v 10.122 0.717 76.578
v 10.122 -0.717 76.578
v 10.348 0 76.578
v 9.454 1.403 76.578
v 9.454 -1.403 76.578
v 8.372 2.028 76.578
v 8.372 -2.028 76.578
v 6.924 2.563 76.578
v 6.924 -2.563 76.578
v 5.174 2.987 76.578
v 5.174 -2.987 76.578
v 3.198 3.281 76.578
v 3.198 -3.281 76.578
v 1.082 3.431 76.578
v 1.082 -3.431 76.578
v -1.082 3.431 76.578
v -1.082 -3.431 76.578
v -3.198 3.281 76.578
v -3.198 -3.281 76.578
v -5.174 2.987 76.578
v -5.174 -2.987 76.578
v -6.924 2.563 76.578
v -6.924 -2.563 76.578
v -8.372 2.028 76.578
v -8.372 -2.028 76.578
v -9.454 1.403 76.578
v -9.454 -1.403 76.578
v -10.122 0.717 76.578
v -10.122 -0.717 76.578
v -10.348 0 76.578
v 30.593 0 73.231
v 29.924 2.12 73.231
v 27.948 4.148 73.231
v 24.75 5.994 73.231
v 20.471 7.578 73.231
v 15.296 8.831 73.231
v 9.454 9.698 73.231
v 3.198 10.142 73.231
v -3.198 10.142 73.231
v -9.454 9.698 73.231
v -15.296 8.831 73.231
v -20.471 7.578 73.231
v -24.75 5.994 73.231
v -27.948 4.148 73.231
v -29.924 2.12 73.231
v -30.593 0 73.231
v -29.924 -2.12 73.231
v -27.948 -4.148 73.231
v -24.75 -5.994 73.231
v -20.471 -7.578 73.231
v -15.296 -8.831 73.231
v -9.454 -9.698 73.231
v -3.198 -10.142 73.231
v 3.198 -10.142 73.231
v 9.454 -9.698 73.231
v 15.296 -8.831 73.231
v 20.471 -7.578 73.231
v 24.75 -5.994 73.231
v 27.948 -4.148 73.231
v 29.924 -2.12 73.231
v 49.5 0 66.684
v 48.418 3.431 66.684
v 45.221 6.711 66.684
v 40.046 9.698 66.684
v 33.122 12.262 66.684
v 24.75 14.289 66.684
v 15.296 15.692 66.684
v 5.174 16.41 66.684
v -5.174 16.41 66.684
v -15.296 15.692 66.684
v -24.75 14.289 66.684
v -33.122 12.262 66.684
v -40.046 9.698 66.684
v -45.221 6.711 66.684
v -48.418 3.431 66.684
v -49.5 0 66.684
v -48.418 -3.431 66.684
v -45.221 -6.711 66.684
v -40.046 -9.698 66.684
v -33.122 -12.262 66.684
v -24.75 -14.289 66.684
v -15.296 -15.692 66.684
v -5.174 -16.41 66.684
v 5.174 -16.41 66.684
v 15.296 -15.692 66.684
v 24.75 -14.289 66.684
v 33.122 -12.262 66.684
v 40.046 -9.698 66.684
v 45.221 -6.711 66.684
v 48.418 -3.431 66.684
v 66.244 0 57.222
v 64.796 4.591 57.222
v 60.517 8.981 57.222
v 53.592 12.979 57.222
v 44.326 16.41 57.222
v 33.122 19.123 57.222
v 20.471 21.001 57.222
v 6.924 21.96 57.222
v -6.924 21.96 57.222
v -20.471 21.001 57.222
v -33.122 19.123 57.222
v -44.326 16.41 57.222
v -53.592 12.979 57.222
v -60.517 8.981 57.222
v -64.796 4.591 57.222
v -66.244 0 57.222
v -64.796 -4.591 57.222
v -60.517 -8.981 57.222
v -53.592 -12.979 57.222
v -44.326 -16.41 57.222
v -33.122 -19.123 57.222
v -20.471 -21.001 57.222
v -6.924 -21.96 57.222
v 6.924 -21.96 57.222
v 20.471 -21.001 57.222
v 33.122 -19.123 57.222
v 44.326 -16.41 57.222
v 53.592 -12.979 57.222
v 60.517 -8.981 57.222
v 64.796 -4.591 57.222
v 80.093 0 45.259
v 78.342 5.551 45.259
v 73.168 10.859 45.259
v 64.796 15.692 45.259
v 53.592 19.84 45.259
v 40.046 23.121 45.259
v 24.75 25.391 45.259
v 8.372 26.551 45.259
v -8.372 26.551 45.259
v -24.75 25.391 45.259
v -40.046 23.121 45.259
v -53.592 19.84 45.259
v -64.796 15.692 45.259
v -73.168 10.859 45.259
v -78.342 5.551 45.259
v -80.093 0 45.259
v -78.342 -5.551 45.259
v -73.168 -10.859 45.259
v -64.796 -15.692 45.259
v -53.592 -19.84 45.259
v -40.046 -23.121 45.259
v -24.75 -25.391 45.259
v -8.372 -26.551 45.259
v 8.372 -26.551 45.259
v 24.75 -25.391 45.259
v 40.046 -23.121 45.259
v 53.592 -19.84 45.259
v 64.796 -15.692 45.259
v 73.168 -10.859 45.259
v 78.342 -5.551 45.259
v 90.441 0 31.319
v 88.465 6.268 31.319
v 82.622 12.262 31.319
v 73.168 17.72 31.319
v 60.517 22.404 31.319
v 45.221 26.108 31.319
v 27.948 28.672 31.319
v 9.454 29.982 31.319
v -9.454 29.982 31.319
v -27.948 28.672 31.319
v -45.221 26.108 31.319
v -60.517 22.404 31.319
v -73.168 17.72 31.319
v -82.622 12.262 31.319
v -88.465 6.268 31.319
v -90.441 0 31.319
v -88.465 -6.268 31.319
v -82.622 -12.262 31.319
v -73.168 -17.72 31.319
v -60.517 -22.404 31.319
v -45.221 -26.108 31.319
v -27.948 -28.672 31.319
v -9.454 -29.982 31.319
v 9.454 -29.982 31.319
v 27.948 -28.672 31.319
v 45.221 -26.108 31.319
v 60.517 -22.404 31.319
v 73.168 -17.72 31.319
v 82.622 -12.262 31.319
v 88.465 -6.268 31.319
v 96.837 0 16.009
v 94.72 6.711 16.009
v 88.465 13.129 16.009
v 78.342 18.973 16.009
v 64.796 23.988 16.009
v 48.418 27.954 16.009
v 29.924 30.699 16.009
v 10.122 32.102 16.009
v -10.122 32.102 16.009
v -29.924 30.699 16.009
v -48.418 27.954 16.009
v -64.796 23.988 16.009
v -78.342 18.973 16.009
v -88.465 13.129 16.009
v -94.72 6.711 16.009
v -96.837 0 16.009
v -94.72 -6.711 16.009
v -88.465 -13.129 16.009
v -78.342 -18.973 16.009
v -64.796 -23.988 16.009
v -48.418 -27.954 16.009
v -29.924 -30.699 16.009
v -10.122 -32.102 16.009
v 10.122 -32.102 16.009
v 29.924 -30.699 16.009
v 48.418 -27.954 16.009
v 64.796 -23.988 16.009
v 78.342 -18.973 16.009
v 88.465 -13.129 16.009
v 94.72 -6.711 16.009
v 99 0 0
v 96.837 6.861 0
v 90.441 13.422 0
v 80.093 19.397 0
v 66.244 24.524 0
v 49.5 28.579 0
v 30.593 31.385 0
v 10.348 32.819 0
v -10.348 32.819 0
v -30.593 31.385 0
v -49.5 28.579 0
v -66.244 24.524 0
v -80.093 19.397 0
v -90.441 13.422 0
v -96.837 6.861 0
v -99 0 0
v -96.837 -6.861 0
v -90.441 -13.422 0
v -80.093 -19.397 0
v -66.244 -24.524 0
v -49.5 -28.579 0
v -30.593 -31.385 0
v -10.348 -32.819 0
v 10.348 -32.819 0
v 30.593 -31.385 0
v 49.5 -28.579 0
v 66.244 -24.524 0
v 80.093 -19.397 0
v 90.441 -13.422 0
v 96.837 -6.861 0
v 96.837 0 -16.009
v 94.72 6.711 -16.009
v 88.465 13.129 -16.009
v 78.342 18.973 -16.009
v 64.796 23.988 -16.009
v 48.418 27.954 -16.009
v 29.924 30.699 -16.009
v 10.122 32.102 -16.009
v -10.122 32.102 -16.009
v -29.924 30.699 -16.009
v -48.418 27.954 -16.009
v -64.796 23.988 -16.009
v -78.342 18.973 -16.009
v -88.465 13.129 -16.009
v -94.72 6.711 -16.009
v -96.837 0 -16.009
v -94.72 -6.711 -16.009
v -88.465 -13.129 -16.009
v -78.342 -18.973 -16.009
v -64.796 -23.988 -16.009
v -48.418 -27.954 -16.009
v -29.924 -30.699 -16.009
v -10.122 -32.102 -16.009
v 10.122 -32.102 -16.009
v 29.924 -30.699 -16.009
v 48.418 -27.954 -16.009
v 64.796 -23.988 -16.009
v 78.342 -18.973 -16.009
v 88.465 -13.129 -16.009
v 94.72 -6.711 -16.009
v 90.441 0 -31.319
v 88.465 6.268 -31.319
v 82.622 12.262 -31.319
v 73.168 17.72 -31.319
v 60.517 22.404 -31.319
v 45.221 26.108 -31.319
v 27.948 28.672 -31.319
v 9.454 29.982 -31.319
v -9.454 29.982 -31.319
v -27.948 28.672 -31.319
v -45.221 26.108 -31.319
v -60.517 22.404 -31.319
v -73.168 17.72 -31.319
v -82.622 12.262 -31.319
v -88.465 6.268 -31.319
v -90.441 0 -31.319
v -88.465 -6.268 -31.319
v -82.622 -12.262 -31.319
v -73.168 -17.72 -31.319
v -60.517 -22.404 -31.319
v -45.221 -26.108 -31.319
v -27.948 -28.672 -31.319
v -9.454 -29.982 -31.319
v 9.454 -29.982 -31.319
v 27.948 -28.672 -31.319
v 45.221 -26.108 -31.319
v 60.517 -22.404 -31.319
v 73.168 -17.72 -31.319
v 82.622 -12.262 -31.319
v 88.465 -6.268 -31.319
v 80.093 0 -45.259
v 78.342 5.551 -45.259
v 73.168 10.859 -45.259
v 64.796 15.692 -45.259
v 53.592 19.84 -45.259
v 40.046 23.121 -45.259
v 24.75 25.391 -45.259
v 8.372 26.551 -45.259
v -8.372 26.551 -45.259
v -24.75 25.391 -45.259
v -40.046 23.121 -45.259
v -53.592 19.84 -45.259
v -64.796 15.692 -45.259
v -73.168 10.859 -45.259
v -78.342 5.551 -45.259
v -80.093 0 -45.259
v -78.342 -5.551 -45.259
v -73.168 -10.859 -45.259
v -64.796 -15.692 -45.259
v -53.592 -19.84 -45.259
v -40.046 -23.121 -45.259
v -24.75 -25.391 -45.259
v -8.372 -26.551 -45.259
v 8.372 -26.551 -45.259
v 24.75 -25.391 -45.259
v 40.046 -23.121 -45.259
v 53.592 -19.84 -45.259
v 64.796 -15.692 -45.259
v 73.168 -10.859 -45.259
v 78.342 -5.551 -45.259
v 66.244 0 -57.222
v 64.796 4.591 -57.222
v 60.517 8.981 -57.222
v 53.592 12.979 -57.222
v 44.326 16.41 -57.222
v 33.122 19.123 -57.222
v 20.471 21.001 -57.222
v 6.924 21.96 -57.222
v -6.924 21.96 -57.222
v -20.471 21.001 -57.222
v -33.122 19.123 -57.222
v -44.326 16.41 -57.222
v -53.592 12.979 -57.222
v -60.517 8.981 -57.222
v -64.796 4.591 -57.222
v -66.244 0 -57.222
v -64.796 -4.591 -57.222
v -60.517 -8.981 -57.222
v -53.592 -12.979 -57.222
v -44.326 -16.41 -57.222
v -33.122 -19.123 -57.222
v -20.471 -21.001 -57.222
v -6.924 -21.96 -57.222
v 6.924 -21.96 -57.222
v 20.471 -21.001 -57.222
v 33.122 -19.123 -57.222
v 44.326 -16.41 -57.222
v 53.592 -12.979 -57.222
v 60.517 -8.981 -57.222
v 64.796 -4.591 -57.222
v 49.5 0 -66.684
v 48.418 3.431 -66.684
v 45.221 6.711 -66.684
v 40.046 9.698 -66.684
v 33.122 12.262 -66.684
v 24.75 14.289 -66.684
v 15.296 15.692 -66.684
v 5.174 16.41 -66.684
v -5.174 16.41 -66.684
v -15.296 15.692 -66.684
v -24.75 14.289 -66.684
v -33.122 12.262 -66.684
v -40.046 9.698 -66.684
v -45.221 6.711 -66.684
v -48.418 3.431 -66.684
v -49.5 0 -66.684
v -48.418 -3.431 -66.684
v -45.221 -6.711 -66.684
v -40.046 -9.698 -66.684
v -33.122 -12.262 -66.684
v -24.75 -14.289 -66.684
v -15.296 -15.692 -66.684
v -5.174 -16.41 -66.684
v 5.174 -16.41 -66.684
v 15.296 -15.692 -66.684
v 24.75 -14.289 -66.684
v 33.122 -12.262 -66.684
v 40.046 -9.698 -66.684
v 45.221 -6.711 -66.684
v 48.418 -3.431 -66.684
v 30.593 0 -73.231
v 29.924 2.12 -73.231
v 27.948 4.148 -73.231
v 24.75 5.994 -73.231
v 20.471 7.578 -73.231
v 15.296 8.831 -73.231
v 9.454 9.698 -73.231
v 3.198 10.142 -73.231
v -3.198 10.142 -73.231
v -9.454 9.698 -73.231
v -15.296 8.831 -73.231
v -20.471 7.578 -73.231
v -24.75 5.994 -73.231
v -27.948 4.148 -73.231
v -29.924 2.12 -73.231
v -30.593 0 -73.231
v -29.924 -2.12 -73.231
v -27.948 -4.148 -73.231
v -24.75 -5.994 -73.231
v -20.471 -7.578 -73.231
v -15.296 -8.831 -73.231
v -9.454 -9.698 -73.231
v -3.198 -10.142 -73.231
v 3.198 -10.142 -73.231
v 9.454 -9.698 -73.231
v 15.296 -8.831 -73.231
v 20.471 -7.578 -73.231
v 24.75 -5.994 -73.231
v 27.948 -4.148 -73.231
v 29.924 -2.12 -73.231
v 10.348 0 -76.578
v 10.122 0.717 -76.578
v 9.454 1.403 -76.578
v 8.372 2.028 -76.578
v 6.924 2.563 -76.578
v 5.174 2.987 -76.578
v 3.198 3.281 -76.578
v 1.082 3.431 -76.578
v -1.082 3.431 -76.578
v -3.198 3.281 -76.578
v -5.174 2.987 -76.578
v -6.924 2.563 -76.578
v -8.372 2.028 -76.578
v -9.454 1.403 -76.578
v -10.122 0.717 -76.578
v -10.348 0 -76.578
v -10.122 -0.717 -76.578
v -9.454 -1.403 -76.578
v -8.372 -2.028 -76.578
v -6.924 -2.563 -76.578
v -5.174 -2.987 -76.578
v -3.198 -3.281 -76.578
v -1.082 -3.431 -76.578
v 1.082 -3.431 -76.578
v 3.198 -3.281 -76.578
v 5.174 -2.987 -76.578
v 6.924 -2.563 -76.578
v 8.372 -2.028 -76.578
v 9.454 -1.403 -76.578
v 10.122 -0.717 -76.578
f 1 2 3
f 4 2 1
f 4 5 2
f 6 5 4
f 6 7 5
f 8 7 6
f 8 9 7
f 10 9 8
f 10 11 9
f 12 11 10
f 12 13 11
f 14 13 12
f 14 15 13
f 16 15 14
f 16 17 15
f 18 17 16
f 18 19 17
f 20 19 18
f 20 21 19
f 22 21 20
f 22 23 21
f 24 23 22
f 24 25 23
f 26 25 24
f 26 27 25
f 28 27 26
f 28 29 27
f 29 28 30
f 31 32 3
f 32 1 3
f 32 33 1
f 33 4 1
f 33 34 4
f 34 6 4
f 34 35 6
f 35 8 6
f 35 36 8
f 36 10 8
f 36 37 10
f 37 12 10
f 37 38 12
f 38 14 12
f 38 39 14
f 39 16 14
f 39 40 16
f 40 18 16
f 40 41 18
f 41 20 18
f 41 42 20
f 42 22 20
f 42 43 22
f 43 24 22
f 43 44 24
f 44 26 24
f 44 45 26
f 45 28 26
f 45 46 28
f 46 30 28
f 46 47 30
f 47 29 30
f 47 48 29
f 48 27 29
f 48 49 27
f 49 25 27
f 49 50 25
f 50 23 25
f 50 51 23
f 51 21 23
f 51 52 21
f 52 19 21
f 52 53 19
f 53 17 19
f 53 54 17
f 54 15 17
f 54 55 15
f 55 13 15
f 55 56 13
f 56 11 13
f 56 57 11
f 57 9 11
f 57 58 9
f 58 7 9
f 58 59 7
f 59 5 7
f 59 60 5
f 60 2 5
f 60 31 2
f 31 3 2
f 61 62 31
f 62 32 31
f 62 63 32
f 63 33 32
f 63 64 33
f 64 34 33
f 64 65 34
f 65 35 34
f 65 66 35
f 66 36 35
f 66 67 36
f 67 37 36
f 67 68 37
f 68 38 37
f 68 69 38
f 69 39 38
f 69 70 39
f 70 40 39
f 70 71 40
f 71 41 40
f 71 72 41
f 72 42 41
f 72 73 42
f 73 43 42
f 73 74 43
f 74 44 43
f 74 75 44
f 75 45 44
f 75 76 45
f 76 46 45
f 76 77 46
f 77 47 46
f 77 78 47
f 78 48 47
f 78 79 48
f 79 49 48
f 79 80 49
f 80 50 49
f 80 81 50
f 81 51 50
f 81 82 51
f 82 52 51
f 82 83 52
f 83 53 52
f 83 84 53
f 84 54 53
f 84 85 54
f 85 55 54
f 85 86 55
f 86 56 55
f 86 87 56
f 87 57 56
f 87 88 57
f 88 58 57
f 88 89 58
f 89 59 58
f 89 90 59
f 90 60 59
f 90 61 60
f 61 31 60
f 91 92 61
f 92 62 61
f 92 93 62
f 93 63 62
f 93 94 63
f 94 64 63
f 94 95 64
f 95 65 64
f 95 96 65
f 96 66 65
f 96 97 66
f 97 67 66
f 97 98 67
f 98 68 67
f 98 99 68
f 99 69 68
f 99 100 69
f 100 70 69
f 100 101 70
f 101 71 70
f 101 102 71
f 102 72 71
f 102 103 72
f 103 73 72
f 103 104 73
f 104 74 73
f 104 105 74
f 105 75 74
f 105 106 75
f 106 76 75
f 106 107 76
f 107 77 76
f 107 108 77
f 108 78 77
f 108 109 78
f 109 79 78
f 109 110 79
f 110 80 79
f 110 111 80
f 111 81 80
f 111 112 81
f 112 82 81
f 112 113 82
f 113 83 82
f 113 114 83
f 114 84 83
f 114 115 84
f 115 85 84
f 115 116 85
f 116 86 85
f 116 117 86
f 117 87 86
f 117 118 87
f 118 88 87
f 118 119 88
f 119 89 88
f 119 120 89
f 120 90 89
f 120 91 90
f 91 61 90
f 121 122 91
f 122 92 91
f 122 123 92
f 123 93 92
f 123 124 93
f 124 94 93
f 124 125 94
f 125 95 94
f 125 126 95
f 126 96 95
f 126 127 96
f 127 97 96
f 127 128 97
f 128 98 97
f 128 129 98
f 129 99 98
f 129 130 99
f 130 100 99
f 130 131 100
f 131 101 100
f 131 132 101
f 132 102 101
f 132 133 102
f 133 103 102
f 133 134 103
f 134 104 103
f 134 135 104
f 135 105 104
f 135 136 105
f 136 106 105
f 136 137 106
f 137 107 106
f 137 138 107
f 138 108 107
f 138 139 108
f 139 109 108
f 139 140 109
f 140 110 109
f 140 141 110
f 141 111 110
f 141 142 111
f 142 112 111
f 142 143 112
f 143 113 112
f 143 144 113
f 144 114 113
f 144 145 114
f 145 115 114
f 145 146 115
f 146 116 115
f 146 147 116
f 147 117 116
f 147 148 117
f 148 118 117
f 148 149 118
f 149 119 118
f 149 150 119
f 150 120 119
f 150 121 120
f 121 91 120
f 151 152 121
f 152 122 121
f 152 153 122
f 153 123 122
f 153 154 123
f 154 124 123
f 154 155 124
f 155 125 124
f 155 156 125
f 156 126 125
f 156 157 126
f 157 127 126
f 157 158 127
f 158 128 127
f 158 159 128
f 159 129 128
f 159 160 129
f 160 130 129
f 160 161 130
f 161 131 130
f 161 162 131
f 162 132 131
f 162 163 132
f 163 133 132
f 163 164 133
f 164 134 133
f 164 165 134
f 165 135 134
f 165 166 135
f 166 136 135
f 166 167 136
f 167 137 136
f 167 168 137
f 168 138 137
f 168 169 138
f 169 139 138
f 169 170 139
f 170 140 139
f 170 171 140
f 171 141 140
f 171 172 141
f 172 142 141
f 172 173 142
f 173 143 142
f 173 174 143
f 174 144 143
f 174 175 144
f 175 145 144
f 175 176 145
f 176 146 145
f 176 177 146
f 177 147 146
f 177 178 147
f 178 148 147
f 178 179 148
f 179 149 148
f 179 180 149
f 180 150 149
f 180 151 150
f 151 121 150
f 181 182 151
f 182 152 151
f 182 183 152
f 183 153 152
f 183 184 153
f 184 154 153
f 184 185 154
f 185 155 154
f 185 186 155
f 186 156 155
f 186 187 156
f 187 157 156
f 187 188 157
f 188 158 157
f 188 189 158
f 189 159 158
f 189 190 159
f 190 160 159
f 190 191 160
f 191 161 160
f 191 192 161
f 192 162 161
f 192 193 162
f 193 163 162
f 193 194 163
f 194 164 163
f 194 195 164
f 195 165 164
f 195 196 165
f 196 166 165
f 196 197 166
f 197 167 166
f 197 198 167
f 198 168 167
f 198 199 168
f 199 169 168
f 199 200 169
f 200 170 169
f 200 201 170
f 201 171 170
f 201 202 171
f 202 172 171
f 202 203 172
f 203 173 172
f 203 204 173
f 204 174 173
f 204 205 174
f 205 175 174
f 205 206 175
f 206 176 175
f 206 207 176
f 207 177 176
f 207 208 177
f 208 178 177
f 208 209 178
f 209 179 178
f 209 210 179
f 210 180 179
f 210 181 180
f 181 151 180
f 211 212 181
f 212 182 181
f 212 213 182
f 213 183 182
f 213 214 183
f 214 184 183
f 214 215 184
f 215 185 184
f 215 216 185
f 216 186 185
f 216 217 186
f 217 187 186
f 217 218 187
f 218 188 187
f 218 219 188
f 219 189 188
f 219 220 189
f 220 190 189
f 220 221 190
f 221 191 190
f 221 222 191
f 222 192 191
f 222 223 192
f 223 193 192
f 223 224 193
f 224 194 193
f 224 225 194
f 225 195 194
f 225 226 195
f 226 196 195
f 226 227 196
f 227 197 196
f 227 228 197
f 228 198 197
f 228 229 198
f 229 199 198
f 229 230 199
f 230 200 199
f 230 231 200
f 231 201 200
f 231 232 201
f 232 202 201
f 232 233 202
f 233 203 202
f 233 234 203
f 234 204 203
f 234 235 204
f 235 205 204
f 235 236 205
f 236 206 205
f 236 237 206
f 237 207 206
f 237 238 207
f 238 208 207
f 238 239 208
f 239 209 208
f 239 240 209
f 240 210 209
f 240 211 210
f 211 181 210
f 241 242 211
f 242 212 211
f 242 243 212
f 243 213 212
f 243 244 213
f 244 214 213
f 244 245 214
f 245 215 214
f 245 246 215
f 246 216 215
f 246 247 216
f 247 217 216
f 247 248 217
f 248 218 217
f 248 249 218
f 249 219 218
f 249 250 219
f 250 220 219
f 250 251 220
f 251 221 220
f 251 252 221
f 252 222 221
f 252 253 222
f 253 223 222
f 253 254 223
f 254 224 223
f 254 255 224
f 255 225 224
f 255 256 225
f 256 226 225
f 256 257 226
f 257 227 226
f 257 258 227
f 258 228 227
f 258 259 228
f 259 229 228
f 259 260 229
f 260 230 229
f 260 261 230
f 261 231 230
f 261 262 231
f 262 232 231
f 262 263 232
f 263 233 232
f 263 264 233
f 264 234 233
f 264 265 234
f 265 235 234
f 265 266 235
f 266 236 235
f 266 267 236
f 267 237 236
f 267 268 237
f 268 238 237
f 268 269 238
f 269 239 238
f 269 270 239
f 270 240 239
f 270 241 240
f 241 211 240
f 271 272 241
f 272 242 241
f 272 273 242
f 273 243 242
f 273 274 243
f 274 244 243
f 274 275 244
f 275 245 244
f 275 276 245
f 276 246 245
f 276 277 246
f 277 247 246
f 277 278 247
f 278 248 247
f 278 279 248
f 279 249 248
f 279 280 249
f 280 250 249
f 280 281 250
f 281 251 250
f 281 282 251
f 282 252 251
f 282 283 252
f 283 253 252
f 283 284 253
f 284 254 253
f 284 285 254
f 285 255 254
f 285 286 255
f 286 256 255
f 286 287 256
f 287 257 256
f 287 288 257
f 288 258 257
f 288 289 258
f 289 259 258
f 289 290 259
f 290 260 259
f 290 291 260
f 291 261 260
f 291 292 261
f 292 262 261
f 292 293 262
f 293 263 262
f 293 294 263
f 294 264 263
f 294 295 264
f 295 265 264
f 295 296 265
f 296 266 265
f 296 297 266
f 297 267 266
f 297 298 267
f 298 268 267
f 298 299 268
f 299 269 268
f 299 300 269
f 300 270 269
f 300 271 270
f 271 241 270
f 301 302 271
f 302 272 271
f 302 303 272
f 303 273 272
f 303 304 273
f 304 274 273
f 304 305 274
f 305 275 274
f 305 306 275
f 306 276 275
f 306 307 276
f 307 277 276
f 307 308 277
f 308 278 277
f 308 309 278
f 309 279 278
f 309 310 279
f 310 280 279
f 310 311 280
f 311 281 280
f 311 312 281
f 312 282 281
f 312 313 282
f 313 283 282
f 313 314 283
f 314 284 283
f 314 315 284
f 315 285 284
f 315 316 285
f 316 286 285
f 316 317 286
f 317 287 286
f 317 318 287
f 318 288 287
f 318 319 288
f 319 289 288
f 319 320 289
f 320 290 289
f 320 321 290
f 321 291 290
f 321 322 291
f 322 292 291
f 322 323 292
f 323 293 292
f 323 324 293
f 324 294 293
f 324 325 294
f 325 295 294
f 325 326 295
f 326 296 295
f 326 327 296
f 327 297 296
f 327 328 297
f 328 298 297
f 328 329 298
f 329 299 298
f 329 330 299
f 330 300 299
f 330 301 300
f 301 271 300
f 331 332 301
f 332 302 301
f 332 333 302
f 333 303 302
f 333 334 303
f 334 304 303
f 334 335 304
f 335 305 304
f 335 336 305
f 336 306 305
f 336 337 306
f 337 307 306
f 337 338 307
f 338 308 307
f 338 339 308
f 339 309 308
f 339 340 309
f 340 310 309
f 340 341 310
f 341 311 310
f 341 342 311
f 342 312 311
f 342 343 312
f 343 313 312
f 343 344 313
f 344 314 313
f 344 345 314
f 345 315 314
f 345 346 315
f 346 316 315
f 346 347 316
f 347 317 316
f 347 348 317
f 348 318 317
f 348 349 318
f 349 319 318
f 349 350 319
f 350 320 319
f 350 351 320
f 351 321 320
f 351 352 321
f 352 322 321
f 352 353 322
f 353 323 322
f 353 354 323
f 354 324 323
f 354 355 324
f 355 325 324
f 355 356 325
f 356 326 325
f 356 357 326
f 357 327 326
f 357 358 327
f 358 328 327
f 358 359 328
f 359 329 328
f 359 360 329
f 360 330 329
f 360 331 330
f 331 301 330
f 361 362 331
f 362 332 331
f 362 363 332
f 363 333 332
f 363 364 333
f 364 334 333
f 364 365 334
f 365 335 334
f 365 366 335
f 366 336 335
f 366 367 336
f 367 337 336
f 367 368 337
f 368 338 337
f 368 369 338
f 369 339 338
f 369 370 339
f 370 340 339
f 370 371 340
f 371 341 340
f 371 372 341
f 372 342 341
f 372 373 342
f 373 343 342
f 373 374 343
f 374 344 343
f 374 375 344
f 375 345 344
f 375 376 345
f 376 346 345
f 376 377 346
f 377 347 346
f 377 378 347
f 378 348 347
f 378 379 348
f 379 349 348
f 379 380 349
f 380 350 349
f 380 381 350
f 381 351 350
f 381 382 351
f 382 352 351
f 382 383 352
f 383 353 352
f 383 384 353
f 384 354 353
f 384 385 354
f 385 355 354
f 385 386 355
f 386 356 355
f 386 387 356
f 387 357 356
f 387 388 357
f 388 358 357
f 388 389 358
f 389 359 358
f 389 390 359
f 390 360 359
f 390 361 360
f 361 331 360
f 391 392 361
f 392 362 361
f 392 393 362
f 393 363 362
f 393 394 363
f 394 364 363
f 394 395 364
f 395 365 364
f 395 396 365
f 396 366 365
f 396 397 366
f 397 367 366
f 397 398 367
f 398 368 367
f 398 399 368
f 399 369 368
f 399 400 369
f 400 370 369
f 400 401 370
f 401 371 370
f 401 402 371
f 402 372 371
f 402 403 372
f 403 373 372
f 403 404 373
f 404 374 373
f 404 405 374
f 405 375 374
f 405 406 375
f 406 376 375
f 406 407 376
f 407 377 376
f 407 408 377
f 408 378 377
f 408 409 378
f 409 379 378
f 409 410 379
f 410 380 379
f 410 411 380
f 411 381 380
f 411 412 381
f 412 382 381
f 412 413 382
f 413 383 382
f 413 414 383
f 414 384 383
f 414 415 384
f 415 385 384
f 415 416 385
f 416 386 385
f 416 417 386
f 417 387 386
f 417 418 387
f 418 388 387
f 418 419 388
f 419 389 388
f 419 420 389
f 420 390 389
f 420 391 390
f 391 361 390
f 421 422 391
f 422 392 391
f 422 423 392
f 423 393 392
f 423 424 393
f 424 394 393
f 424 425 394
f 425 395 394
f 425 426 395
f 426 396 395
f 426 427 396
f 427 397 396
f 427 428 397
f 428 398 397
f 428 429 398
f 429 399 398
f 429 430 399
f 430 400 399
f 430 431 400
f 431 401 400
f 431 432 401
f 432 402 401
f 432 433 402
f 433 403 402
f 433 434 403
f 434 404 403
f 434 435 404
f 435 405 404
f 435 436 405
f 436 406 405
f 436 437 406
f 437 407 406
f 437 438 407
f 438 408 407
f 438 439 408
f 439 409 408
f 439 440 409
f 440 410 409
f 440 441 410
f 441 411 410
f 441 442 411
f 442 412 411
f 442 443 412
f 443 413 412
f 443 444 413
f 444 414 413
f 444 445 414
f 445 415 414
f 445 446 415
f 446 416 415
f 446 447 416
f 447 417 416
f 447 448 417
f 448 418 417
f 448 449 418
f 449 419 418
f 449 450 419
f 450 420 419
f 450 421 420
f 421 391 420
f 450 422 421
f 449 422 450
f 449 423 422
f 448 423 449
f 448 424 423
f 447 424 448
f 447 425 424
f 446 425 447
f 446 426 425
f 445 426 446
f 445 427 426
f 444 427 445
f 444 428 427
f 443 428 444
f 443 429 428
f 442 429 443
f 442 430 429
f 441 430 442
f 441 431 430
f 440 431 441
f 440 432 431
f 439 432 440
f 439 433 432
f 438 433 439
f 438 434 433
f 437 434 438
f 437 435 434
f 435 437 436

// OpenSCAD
// Generated by SolidPython 1.0.1 on 2020-07-29 00:46:48


scale(v = [9, 3, 7]) {
	sphere(r = 11);
}
/***********************************************
*********      SolidPython code:      **********
************************************************
 
# import packages: SolidPython
from solid import *
from solid.utils import *
from itertools import chain, combinations, permutations


class Resize:

    def __init__(self, scad_file):
        self.scad_file = scad_file
        #self.scad_file = import_scad(scad_file)
        # cone/cylinder param:
        self.r1 = 0
        self.r2 = 0
        self.h = 0
        # rectangular prism param:
        self.w = 0
        self.l = 0
        # ellipse param:
        self.r = 0

    # import OpenScad code (file name corresponds to shape)


    # classify shape + parameters
    def assign(self, param1, param2, param3):
        if self.scad_file == 'cone.scad':
            self.r1 = param1
            self.r2 = param2
            self.h = param3
        elif self.scad_file == 'cylinder.scad':
            self.r1 = param1
            self.r2 = param2
            self.h = param3
        elif self.scad_file == 'rectangularPrism.scad':
            self.h = param1
            self.l = param2
            self.w = param3
        else:
            self.r = param1
            self.h = param2

    # resize parameters
    def iterate(self):
        x = range(3, 20, 2)
        i = 1
        if self.scad_file == 'cone.scad':
            tempList = list(permutations(x, 2))
            for temp in tempList:
                param1 = temp[0]
                param2 = temp[1]
                filepath = 'produced_scad_files/' + 'cone' + str(param1) + '_' + str(param2) + '_' + '.scad'
                scad_render_to_file(cylinder(h=param1, r1=param2, r2=0), filepath)

        elif self.scad_file == 'cylinder.scad':
            tempList = list(permutations(x, 3))
            for temp in tempList:
                param1 = temp[0]
                param2 = temp[1]
                filepath = 'produced_scad_files/' + 'cylinder' + str(param1) + '_' + str(param2) + '_' + '.scad'
                scad_render_to_file(cylinder(h=param1, r1=param2, r2=param2), filepath)

        elif self.scad_file == 'rectangularPrism.scad':
            tempList = list(permutations(x, 3))
            for temp in tempList:
                param1 = temp[0]
                param2 = temp[1]
                param3 = temp[2]
                filepath = 'produced_scad_files/' + 'rectangularPrism' + str(param1) + '_' + str(param2) + '_' + str(
                    param3) + '.scad'
                scad_render_to_file(cube(size=(param1, param2, param3)), filepath)

        elif self.scad_file == 'ellipse.scad':
            tempList = list(permutations(x, 4))
            for temp in tempList:
                param1 = temp[0]
                param2 = temp[1]
                param3 = temp[2]
                param4 = temp[3]
                filepath = 'produced_scad_files/' + 'ellipse' + str(param1) + '_' + str(param2) + '_' + str(param3) + '_' + str(param4) + '.scad'
                scad_render_to_file(scale([param1, param2, param3])(sphere(r=param4)), filepath)

    def render_to_scadfile(self):
        scad_render_to_file(scad, 'example.scad') 
 
************************************************/
